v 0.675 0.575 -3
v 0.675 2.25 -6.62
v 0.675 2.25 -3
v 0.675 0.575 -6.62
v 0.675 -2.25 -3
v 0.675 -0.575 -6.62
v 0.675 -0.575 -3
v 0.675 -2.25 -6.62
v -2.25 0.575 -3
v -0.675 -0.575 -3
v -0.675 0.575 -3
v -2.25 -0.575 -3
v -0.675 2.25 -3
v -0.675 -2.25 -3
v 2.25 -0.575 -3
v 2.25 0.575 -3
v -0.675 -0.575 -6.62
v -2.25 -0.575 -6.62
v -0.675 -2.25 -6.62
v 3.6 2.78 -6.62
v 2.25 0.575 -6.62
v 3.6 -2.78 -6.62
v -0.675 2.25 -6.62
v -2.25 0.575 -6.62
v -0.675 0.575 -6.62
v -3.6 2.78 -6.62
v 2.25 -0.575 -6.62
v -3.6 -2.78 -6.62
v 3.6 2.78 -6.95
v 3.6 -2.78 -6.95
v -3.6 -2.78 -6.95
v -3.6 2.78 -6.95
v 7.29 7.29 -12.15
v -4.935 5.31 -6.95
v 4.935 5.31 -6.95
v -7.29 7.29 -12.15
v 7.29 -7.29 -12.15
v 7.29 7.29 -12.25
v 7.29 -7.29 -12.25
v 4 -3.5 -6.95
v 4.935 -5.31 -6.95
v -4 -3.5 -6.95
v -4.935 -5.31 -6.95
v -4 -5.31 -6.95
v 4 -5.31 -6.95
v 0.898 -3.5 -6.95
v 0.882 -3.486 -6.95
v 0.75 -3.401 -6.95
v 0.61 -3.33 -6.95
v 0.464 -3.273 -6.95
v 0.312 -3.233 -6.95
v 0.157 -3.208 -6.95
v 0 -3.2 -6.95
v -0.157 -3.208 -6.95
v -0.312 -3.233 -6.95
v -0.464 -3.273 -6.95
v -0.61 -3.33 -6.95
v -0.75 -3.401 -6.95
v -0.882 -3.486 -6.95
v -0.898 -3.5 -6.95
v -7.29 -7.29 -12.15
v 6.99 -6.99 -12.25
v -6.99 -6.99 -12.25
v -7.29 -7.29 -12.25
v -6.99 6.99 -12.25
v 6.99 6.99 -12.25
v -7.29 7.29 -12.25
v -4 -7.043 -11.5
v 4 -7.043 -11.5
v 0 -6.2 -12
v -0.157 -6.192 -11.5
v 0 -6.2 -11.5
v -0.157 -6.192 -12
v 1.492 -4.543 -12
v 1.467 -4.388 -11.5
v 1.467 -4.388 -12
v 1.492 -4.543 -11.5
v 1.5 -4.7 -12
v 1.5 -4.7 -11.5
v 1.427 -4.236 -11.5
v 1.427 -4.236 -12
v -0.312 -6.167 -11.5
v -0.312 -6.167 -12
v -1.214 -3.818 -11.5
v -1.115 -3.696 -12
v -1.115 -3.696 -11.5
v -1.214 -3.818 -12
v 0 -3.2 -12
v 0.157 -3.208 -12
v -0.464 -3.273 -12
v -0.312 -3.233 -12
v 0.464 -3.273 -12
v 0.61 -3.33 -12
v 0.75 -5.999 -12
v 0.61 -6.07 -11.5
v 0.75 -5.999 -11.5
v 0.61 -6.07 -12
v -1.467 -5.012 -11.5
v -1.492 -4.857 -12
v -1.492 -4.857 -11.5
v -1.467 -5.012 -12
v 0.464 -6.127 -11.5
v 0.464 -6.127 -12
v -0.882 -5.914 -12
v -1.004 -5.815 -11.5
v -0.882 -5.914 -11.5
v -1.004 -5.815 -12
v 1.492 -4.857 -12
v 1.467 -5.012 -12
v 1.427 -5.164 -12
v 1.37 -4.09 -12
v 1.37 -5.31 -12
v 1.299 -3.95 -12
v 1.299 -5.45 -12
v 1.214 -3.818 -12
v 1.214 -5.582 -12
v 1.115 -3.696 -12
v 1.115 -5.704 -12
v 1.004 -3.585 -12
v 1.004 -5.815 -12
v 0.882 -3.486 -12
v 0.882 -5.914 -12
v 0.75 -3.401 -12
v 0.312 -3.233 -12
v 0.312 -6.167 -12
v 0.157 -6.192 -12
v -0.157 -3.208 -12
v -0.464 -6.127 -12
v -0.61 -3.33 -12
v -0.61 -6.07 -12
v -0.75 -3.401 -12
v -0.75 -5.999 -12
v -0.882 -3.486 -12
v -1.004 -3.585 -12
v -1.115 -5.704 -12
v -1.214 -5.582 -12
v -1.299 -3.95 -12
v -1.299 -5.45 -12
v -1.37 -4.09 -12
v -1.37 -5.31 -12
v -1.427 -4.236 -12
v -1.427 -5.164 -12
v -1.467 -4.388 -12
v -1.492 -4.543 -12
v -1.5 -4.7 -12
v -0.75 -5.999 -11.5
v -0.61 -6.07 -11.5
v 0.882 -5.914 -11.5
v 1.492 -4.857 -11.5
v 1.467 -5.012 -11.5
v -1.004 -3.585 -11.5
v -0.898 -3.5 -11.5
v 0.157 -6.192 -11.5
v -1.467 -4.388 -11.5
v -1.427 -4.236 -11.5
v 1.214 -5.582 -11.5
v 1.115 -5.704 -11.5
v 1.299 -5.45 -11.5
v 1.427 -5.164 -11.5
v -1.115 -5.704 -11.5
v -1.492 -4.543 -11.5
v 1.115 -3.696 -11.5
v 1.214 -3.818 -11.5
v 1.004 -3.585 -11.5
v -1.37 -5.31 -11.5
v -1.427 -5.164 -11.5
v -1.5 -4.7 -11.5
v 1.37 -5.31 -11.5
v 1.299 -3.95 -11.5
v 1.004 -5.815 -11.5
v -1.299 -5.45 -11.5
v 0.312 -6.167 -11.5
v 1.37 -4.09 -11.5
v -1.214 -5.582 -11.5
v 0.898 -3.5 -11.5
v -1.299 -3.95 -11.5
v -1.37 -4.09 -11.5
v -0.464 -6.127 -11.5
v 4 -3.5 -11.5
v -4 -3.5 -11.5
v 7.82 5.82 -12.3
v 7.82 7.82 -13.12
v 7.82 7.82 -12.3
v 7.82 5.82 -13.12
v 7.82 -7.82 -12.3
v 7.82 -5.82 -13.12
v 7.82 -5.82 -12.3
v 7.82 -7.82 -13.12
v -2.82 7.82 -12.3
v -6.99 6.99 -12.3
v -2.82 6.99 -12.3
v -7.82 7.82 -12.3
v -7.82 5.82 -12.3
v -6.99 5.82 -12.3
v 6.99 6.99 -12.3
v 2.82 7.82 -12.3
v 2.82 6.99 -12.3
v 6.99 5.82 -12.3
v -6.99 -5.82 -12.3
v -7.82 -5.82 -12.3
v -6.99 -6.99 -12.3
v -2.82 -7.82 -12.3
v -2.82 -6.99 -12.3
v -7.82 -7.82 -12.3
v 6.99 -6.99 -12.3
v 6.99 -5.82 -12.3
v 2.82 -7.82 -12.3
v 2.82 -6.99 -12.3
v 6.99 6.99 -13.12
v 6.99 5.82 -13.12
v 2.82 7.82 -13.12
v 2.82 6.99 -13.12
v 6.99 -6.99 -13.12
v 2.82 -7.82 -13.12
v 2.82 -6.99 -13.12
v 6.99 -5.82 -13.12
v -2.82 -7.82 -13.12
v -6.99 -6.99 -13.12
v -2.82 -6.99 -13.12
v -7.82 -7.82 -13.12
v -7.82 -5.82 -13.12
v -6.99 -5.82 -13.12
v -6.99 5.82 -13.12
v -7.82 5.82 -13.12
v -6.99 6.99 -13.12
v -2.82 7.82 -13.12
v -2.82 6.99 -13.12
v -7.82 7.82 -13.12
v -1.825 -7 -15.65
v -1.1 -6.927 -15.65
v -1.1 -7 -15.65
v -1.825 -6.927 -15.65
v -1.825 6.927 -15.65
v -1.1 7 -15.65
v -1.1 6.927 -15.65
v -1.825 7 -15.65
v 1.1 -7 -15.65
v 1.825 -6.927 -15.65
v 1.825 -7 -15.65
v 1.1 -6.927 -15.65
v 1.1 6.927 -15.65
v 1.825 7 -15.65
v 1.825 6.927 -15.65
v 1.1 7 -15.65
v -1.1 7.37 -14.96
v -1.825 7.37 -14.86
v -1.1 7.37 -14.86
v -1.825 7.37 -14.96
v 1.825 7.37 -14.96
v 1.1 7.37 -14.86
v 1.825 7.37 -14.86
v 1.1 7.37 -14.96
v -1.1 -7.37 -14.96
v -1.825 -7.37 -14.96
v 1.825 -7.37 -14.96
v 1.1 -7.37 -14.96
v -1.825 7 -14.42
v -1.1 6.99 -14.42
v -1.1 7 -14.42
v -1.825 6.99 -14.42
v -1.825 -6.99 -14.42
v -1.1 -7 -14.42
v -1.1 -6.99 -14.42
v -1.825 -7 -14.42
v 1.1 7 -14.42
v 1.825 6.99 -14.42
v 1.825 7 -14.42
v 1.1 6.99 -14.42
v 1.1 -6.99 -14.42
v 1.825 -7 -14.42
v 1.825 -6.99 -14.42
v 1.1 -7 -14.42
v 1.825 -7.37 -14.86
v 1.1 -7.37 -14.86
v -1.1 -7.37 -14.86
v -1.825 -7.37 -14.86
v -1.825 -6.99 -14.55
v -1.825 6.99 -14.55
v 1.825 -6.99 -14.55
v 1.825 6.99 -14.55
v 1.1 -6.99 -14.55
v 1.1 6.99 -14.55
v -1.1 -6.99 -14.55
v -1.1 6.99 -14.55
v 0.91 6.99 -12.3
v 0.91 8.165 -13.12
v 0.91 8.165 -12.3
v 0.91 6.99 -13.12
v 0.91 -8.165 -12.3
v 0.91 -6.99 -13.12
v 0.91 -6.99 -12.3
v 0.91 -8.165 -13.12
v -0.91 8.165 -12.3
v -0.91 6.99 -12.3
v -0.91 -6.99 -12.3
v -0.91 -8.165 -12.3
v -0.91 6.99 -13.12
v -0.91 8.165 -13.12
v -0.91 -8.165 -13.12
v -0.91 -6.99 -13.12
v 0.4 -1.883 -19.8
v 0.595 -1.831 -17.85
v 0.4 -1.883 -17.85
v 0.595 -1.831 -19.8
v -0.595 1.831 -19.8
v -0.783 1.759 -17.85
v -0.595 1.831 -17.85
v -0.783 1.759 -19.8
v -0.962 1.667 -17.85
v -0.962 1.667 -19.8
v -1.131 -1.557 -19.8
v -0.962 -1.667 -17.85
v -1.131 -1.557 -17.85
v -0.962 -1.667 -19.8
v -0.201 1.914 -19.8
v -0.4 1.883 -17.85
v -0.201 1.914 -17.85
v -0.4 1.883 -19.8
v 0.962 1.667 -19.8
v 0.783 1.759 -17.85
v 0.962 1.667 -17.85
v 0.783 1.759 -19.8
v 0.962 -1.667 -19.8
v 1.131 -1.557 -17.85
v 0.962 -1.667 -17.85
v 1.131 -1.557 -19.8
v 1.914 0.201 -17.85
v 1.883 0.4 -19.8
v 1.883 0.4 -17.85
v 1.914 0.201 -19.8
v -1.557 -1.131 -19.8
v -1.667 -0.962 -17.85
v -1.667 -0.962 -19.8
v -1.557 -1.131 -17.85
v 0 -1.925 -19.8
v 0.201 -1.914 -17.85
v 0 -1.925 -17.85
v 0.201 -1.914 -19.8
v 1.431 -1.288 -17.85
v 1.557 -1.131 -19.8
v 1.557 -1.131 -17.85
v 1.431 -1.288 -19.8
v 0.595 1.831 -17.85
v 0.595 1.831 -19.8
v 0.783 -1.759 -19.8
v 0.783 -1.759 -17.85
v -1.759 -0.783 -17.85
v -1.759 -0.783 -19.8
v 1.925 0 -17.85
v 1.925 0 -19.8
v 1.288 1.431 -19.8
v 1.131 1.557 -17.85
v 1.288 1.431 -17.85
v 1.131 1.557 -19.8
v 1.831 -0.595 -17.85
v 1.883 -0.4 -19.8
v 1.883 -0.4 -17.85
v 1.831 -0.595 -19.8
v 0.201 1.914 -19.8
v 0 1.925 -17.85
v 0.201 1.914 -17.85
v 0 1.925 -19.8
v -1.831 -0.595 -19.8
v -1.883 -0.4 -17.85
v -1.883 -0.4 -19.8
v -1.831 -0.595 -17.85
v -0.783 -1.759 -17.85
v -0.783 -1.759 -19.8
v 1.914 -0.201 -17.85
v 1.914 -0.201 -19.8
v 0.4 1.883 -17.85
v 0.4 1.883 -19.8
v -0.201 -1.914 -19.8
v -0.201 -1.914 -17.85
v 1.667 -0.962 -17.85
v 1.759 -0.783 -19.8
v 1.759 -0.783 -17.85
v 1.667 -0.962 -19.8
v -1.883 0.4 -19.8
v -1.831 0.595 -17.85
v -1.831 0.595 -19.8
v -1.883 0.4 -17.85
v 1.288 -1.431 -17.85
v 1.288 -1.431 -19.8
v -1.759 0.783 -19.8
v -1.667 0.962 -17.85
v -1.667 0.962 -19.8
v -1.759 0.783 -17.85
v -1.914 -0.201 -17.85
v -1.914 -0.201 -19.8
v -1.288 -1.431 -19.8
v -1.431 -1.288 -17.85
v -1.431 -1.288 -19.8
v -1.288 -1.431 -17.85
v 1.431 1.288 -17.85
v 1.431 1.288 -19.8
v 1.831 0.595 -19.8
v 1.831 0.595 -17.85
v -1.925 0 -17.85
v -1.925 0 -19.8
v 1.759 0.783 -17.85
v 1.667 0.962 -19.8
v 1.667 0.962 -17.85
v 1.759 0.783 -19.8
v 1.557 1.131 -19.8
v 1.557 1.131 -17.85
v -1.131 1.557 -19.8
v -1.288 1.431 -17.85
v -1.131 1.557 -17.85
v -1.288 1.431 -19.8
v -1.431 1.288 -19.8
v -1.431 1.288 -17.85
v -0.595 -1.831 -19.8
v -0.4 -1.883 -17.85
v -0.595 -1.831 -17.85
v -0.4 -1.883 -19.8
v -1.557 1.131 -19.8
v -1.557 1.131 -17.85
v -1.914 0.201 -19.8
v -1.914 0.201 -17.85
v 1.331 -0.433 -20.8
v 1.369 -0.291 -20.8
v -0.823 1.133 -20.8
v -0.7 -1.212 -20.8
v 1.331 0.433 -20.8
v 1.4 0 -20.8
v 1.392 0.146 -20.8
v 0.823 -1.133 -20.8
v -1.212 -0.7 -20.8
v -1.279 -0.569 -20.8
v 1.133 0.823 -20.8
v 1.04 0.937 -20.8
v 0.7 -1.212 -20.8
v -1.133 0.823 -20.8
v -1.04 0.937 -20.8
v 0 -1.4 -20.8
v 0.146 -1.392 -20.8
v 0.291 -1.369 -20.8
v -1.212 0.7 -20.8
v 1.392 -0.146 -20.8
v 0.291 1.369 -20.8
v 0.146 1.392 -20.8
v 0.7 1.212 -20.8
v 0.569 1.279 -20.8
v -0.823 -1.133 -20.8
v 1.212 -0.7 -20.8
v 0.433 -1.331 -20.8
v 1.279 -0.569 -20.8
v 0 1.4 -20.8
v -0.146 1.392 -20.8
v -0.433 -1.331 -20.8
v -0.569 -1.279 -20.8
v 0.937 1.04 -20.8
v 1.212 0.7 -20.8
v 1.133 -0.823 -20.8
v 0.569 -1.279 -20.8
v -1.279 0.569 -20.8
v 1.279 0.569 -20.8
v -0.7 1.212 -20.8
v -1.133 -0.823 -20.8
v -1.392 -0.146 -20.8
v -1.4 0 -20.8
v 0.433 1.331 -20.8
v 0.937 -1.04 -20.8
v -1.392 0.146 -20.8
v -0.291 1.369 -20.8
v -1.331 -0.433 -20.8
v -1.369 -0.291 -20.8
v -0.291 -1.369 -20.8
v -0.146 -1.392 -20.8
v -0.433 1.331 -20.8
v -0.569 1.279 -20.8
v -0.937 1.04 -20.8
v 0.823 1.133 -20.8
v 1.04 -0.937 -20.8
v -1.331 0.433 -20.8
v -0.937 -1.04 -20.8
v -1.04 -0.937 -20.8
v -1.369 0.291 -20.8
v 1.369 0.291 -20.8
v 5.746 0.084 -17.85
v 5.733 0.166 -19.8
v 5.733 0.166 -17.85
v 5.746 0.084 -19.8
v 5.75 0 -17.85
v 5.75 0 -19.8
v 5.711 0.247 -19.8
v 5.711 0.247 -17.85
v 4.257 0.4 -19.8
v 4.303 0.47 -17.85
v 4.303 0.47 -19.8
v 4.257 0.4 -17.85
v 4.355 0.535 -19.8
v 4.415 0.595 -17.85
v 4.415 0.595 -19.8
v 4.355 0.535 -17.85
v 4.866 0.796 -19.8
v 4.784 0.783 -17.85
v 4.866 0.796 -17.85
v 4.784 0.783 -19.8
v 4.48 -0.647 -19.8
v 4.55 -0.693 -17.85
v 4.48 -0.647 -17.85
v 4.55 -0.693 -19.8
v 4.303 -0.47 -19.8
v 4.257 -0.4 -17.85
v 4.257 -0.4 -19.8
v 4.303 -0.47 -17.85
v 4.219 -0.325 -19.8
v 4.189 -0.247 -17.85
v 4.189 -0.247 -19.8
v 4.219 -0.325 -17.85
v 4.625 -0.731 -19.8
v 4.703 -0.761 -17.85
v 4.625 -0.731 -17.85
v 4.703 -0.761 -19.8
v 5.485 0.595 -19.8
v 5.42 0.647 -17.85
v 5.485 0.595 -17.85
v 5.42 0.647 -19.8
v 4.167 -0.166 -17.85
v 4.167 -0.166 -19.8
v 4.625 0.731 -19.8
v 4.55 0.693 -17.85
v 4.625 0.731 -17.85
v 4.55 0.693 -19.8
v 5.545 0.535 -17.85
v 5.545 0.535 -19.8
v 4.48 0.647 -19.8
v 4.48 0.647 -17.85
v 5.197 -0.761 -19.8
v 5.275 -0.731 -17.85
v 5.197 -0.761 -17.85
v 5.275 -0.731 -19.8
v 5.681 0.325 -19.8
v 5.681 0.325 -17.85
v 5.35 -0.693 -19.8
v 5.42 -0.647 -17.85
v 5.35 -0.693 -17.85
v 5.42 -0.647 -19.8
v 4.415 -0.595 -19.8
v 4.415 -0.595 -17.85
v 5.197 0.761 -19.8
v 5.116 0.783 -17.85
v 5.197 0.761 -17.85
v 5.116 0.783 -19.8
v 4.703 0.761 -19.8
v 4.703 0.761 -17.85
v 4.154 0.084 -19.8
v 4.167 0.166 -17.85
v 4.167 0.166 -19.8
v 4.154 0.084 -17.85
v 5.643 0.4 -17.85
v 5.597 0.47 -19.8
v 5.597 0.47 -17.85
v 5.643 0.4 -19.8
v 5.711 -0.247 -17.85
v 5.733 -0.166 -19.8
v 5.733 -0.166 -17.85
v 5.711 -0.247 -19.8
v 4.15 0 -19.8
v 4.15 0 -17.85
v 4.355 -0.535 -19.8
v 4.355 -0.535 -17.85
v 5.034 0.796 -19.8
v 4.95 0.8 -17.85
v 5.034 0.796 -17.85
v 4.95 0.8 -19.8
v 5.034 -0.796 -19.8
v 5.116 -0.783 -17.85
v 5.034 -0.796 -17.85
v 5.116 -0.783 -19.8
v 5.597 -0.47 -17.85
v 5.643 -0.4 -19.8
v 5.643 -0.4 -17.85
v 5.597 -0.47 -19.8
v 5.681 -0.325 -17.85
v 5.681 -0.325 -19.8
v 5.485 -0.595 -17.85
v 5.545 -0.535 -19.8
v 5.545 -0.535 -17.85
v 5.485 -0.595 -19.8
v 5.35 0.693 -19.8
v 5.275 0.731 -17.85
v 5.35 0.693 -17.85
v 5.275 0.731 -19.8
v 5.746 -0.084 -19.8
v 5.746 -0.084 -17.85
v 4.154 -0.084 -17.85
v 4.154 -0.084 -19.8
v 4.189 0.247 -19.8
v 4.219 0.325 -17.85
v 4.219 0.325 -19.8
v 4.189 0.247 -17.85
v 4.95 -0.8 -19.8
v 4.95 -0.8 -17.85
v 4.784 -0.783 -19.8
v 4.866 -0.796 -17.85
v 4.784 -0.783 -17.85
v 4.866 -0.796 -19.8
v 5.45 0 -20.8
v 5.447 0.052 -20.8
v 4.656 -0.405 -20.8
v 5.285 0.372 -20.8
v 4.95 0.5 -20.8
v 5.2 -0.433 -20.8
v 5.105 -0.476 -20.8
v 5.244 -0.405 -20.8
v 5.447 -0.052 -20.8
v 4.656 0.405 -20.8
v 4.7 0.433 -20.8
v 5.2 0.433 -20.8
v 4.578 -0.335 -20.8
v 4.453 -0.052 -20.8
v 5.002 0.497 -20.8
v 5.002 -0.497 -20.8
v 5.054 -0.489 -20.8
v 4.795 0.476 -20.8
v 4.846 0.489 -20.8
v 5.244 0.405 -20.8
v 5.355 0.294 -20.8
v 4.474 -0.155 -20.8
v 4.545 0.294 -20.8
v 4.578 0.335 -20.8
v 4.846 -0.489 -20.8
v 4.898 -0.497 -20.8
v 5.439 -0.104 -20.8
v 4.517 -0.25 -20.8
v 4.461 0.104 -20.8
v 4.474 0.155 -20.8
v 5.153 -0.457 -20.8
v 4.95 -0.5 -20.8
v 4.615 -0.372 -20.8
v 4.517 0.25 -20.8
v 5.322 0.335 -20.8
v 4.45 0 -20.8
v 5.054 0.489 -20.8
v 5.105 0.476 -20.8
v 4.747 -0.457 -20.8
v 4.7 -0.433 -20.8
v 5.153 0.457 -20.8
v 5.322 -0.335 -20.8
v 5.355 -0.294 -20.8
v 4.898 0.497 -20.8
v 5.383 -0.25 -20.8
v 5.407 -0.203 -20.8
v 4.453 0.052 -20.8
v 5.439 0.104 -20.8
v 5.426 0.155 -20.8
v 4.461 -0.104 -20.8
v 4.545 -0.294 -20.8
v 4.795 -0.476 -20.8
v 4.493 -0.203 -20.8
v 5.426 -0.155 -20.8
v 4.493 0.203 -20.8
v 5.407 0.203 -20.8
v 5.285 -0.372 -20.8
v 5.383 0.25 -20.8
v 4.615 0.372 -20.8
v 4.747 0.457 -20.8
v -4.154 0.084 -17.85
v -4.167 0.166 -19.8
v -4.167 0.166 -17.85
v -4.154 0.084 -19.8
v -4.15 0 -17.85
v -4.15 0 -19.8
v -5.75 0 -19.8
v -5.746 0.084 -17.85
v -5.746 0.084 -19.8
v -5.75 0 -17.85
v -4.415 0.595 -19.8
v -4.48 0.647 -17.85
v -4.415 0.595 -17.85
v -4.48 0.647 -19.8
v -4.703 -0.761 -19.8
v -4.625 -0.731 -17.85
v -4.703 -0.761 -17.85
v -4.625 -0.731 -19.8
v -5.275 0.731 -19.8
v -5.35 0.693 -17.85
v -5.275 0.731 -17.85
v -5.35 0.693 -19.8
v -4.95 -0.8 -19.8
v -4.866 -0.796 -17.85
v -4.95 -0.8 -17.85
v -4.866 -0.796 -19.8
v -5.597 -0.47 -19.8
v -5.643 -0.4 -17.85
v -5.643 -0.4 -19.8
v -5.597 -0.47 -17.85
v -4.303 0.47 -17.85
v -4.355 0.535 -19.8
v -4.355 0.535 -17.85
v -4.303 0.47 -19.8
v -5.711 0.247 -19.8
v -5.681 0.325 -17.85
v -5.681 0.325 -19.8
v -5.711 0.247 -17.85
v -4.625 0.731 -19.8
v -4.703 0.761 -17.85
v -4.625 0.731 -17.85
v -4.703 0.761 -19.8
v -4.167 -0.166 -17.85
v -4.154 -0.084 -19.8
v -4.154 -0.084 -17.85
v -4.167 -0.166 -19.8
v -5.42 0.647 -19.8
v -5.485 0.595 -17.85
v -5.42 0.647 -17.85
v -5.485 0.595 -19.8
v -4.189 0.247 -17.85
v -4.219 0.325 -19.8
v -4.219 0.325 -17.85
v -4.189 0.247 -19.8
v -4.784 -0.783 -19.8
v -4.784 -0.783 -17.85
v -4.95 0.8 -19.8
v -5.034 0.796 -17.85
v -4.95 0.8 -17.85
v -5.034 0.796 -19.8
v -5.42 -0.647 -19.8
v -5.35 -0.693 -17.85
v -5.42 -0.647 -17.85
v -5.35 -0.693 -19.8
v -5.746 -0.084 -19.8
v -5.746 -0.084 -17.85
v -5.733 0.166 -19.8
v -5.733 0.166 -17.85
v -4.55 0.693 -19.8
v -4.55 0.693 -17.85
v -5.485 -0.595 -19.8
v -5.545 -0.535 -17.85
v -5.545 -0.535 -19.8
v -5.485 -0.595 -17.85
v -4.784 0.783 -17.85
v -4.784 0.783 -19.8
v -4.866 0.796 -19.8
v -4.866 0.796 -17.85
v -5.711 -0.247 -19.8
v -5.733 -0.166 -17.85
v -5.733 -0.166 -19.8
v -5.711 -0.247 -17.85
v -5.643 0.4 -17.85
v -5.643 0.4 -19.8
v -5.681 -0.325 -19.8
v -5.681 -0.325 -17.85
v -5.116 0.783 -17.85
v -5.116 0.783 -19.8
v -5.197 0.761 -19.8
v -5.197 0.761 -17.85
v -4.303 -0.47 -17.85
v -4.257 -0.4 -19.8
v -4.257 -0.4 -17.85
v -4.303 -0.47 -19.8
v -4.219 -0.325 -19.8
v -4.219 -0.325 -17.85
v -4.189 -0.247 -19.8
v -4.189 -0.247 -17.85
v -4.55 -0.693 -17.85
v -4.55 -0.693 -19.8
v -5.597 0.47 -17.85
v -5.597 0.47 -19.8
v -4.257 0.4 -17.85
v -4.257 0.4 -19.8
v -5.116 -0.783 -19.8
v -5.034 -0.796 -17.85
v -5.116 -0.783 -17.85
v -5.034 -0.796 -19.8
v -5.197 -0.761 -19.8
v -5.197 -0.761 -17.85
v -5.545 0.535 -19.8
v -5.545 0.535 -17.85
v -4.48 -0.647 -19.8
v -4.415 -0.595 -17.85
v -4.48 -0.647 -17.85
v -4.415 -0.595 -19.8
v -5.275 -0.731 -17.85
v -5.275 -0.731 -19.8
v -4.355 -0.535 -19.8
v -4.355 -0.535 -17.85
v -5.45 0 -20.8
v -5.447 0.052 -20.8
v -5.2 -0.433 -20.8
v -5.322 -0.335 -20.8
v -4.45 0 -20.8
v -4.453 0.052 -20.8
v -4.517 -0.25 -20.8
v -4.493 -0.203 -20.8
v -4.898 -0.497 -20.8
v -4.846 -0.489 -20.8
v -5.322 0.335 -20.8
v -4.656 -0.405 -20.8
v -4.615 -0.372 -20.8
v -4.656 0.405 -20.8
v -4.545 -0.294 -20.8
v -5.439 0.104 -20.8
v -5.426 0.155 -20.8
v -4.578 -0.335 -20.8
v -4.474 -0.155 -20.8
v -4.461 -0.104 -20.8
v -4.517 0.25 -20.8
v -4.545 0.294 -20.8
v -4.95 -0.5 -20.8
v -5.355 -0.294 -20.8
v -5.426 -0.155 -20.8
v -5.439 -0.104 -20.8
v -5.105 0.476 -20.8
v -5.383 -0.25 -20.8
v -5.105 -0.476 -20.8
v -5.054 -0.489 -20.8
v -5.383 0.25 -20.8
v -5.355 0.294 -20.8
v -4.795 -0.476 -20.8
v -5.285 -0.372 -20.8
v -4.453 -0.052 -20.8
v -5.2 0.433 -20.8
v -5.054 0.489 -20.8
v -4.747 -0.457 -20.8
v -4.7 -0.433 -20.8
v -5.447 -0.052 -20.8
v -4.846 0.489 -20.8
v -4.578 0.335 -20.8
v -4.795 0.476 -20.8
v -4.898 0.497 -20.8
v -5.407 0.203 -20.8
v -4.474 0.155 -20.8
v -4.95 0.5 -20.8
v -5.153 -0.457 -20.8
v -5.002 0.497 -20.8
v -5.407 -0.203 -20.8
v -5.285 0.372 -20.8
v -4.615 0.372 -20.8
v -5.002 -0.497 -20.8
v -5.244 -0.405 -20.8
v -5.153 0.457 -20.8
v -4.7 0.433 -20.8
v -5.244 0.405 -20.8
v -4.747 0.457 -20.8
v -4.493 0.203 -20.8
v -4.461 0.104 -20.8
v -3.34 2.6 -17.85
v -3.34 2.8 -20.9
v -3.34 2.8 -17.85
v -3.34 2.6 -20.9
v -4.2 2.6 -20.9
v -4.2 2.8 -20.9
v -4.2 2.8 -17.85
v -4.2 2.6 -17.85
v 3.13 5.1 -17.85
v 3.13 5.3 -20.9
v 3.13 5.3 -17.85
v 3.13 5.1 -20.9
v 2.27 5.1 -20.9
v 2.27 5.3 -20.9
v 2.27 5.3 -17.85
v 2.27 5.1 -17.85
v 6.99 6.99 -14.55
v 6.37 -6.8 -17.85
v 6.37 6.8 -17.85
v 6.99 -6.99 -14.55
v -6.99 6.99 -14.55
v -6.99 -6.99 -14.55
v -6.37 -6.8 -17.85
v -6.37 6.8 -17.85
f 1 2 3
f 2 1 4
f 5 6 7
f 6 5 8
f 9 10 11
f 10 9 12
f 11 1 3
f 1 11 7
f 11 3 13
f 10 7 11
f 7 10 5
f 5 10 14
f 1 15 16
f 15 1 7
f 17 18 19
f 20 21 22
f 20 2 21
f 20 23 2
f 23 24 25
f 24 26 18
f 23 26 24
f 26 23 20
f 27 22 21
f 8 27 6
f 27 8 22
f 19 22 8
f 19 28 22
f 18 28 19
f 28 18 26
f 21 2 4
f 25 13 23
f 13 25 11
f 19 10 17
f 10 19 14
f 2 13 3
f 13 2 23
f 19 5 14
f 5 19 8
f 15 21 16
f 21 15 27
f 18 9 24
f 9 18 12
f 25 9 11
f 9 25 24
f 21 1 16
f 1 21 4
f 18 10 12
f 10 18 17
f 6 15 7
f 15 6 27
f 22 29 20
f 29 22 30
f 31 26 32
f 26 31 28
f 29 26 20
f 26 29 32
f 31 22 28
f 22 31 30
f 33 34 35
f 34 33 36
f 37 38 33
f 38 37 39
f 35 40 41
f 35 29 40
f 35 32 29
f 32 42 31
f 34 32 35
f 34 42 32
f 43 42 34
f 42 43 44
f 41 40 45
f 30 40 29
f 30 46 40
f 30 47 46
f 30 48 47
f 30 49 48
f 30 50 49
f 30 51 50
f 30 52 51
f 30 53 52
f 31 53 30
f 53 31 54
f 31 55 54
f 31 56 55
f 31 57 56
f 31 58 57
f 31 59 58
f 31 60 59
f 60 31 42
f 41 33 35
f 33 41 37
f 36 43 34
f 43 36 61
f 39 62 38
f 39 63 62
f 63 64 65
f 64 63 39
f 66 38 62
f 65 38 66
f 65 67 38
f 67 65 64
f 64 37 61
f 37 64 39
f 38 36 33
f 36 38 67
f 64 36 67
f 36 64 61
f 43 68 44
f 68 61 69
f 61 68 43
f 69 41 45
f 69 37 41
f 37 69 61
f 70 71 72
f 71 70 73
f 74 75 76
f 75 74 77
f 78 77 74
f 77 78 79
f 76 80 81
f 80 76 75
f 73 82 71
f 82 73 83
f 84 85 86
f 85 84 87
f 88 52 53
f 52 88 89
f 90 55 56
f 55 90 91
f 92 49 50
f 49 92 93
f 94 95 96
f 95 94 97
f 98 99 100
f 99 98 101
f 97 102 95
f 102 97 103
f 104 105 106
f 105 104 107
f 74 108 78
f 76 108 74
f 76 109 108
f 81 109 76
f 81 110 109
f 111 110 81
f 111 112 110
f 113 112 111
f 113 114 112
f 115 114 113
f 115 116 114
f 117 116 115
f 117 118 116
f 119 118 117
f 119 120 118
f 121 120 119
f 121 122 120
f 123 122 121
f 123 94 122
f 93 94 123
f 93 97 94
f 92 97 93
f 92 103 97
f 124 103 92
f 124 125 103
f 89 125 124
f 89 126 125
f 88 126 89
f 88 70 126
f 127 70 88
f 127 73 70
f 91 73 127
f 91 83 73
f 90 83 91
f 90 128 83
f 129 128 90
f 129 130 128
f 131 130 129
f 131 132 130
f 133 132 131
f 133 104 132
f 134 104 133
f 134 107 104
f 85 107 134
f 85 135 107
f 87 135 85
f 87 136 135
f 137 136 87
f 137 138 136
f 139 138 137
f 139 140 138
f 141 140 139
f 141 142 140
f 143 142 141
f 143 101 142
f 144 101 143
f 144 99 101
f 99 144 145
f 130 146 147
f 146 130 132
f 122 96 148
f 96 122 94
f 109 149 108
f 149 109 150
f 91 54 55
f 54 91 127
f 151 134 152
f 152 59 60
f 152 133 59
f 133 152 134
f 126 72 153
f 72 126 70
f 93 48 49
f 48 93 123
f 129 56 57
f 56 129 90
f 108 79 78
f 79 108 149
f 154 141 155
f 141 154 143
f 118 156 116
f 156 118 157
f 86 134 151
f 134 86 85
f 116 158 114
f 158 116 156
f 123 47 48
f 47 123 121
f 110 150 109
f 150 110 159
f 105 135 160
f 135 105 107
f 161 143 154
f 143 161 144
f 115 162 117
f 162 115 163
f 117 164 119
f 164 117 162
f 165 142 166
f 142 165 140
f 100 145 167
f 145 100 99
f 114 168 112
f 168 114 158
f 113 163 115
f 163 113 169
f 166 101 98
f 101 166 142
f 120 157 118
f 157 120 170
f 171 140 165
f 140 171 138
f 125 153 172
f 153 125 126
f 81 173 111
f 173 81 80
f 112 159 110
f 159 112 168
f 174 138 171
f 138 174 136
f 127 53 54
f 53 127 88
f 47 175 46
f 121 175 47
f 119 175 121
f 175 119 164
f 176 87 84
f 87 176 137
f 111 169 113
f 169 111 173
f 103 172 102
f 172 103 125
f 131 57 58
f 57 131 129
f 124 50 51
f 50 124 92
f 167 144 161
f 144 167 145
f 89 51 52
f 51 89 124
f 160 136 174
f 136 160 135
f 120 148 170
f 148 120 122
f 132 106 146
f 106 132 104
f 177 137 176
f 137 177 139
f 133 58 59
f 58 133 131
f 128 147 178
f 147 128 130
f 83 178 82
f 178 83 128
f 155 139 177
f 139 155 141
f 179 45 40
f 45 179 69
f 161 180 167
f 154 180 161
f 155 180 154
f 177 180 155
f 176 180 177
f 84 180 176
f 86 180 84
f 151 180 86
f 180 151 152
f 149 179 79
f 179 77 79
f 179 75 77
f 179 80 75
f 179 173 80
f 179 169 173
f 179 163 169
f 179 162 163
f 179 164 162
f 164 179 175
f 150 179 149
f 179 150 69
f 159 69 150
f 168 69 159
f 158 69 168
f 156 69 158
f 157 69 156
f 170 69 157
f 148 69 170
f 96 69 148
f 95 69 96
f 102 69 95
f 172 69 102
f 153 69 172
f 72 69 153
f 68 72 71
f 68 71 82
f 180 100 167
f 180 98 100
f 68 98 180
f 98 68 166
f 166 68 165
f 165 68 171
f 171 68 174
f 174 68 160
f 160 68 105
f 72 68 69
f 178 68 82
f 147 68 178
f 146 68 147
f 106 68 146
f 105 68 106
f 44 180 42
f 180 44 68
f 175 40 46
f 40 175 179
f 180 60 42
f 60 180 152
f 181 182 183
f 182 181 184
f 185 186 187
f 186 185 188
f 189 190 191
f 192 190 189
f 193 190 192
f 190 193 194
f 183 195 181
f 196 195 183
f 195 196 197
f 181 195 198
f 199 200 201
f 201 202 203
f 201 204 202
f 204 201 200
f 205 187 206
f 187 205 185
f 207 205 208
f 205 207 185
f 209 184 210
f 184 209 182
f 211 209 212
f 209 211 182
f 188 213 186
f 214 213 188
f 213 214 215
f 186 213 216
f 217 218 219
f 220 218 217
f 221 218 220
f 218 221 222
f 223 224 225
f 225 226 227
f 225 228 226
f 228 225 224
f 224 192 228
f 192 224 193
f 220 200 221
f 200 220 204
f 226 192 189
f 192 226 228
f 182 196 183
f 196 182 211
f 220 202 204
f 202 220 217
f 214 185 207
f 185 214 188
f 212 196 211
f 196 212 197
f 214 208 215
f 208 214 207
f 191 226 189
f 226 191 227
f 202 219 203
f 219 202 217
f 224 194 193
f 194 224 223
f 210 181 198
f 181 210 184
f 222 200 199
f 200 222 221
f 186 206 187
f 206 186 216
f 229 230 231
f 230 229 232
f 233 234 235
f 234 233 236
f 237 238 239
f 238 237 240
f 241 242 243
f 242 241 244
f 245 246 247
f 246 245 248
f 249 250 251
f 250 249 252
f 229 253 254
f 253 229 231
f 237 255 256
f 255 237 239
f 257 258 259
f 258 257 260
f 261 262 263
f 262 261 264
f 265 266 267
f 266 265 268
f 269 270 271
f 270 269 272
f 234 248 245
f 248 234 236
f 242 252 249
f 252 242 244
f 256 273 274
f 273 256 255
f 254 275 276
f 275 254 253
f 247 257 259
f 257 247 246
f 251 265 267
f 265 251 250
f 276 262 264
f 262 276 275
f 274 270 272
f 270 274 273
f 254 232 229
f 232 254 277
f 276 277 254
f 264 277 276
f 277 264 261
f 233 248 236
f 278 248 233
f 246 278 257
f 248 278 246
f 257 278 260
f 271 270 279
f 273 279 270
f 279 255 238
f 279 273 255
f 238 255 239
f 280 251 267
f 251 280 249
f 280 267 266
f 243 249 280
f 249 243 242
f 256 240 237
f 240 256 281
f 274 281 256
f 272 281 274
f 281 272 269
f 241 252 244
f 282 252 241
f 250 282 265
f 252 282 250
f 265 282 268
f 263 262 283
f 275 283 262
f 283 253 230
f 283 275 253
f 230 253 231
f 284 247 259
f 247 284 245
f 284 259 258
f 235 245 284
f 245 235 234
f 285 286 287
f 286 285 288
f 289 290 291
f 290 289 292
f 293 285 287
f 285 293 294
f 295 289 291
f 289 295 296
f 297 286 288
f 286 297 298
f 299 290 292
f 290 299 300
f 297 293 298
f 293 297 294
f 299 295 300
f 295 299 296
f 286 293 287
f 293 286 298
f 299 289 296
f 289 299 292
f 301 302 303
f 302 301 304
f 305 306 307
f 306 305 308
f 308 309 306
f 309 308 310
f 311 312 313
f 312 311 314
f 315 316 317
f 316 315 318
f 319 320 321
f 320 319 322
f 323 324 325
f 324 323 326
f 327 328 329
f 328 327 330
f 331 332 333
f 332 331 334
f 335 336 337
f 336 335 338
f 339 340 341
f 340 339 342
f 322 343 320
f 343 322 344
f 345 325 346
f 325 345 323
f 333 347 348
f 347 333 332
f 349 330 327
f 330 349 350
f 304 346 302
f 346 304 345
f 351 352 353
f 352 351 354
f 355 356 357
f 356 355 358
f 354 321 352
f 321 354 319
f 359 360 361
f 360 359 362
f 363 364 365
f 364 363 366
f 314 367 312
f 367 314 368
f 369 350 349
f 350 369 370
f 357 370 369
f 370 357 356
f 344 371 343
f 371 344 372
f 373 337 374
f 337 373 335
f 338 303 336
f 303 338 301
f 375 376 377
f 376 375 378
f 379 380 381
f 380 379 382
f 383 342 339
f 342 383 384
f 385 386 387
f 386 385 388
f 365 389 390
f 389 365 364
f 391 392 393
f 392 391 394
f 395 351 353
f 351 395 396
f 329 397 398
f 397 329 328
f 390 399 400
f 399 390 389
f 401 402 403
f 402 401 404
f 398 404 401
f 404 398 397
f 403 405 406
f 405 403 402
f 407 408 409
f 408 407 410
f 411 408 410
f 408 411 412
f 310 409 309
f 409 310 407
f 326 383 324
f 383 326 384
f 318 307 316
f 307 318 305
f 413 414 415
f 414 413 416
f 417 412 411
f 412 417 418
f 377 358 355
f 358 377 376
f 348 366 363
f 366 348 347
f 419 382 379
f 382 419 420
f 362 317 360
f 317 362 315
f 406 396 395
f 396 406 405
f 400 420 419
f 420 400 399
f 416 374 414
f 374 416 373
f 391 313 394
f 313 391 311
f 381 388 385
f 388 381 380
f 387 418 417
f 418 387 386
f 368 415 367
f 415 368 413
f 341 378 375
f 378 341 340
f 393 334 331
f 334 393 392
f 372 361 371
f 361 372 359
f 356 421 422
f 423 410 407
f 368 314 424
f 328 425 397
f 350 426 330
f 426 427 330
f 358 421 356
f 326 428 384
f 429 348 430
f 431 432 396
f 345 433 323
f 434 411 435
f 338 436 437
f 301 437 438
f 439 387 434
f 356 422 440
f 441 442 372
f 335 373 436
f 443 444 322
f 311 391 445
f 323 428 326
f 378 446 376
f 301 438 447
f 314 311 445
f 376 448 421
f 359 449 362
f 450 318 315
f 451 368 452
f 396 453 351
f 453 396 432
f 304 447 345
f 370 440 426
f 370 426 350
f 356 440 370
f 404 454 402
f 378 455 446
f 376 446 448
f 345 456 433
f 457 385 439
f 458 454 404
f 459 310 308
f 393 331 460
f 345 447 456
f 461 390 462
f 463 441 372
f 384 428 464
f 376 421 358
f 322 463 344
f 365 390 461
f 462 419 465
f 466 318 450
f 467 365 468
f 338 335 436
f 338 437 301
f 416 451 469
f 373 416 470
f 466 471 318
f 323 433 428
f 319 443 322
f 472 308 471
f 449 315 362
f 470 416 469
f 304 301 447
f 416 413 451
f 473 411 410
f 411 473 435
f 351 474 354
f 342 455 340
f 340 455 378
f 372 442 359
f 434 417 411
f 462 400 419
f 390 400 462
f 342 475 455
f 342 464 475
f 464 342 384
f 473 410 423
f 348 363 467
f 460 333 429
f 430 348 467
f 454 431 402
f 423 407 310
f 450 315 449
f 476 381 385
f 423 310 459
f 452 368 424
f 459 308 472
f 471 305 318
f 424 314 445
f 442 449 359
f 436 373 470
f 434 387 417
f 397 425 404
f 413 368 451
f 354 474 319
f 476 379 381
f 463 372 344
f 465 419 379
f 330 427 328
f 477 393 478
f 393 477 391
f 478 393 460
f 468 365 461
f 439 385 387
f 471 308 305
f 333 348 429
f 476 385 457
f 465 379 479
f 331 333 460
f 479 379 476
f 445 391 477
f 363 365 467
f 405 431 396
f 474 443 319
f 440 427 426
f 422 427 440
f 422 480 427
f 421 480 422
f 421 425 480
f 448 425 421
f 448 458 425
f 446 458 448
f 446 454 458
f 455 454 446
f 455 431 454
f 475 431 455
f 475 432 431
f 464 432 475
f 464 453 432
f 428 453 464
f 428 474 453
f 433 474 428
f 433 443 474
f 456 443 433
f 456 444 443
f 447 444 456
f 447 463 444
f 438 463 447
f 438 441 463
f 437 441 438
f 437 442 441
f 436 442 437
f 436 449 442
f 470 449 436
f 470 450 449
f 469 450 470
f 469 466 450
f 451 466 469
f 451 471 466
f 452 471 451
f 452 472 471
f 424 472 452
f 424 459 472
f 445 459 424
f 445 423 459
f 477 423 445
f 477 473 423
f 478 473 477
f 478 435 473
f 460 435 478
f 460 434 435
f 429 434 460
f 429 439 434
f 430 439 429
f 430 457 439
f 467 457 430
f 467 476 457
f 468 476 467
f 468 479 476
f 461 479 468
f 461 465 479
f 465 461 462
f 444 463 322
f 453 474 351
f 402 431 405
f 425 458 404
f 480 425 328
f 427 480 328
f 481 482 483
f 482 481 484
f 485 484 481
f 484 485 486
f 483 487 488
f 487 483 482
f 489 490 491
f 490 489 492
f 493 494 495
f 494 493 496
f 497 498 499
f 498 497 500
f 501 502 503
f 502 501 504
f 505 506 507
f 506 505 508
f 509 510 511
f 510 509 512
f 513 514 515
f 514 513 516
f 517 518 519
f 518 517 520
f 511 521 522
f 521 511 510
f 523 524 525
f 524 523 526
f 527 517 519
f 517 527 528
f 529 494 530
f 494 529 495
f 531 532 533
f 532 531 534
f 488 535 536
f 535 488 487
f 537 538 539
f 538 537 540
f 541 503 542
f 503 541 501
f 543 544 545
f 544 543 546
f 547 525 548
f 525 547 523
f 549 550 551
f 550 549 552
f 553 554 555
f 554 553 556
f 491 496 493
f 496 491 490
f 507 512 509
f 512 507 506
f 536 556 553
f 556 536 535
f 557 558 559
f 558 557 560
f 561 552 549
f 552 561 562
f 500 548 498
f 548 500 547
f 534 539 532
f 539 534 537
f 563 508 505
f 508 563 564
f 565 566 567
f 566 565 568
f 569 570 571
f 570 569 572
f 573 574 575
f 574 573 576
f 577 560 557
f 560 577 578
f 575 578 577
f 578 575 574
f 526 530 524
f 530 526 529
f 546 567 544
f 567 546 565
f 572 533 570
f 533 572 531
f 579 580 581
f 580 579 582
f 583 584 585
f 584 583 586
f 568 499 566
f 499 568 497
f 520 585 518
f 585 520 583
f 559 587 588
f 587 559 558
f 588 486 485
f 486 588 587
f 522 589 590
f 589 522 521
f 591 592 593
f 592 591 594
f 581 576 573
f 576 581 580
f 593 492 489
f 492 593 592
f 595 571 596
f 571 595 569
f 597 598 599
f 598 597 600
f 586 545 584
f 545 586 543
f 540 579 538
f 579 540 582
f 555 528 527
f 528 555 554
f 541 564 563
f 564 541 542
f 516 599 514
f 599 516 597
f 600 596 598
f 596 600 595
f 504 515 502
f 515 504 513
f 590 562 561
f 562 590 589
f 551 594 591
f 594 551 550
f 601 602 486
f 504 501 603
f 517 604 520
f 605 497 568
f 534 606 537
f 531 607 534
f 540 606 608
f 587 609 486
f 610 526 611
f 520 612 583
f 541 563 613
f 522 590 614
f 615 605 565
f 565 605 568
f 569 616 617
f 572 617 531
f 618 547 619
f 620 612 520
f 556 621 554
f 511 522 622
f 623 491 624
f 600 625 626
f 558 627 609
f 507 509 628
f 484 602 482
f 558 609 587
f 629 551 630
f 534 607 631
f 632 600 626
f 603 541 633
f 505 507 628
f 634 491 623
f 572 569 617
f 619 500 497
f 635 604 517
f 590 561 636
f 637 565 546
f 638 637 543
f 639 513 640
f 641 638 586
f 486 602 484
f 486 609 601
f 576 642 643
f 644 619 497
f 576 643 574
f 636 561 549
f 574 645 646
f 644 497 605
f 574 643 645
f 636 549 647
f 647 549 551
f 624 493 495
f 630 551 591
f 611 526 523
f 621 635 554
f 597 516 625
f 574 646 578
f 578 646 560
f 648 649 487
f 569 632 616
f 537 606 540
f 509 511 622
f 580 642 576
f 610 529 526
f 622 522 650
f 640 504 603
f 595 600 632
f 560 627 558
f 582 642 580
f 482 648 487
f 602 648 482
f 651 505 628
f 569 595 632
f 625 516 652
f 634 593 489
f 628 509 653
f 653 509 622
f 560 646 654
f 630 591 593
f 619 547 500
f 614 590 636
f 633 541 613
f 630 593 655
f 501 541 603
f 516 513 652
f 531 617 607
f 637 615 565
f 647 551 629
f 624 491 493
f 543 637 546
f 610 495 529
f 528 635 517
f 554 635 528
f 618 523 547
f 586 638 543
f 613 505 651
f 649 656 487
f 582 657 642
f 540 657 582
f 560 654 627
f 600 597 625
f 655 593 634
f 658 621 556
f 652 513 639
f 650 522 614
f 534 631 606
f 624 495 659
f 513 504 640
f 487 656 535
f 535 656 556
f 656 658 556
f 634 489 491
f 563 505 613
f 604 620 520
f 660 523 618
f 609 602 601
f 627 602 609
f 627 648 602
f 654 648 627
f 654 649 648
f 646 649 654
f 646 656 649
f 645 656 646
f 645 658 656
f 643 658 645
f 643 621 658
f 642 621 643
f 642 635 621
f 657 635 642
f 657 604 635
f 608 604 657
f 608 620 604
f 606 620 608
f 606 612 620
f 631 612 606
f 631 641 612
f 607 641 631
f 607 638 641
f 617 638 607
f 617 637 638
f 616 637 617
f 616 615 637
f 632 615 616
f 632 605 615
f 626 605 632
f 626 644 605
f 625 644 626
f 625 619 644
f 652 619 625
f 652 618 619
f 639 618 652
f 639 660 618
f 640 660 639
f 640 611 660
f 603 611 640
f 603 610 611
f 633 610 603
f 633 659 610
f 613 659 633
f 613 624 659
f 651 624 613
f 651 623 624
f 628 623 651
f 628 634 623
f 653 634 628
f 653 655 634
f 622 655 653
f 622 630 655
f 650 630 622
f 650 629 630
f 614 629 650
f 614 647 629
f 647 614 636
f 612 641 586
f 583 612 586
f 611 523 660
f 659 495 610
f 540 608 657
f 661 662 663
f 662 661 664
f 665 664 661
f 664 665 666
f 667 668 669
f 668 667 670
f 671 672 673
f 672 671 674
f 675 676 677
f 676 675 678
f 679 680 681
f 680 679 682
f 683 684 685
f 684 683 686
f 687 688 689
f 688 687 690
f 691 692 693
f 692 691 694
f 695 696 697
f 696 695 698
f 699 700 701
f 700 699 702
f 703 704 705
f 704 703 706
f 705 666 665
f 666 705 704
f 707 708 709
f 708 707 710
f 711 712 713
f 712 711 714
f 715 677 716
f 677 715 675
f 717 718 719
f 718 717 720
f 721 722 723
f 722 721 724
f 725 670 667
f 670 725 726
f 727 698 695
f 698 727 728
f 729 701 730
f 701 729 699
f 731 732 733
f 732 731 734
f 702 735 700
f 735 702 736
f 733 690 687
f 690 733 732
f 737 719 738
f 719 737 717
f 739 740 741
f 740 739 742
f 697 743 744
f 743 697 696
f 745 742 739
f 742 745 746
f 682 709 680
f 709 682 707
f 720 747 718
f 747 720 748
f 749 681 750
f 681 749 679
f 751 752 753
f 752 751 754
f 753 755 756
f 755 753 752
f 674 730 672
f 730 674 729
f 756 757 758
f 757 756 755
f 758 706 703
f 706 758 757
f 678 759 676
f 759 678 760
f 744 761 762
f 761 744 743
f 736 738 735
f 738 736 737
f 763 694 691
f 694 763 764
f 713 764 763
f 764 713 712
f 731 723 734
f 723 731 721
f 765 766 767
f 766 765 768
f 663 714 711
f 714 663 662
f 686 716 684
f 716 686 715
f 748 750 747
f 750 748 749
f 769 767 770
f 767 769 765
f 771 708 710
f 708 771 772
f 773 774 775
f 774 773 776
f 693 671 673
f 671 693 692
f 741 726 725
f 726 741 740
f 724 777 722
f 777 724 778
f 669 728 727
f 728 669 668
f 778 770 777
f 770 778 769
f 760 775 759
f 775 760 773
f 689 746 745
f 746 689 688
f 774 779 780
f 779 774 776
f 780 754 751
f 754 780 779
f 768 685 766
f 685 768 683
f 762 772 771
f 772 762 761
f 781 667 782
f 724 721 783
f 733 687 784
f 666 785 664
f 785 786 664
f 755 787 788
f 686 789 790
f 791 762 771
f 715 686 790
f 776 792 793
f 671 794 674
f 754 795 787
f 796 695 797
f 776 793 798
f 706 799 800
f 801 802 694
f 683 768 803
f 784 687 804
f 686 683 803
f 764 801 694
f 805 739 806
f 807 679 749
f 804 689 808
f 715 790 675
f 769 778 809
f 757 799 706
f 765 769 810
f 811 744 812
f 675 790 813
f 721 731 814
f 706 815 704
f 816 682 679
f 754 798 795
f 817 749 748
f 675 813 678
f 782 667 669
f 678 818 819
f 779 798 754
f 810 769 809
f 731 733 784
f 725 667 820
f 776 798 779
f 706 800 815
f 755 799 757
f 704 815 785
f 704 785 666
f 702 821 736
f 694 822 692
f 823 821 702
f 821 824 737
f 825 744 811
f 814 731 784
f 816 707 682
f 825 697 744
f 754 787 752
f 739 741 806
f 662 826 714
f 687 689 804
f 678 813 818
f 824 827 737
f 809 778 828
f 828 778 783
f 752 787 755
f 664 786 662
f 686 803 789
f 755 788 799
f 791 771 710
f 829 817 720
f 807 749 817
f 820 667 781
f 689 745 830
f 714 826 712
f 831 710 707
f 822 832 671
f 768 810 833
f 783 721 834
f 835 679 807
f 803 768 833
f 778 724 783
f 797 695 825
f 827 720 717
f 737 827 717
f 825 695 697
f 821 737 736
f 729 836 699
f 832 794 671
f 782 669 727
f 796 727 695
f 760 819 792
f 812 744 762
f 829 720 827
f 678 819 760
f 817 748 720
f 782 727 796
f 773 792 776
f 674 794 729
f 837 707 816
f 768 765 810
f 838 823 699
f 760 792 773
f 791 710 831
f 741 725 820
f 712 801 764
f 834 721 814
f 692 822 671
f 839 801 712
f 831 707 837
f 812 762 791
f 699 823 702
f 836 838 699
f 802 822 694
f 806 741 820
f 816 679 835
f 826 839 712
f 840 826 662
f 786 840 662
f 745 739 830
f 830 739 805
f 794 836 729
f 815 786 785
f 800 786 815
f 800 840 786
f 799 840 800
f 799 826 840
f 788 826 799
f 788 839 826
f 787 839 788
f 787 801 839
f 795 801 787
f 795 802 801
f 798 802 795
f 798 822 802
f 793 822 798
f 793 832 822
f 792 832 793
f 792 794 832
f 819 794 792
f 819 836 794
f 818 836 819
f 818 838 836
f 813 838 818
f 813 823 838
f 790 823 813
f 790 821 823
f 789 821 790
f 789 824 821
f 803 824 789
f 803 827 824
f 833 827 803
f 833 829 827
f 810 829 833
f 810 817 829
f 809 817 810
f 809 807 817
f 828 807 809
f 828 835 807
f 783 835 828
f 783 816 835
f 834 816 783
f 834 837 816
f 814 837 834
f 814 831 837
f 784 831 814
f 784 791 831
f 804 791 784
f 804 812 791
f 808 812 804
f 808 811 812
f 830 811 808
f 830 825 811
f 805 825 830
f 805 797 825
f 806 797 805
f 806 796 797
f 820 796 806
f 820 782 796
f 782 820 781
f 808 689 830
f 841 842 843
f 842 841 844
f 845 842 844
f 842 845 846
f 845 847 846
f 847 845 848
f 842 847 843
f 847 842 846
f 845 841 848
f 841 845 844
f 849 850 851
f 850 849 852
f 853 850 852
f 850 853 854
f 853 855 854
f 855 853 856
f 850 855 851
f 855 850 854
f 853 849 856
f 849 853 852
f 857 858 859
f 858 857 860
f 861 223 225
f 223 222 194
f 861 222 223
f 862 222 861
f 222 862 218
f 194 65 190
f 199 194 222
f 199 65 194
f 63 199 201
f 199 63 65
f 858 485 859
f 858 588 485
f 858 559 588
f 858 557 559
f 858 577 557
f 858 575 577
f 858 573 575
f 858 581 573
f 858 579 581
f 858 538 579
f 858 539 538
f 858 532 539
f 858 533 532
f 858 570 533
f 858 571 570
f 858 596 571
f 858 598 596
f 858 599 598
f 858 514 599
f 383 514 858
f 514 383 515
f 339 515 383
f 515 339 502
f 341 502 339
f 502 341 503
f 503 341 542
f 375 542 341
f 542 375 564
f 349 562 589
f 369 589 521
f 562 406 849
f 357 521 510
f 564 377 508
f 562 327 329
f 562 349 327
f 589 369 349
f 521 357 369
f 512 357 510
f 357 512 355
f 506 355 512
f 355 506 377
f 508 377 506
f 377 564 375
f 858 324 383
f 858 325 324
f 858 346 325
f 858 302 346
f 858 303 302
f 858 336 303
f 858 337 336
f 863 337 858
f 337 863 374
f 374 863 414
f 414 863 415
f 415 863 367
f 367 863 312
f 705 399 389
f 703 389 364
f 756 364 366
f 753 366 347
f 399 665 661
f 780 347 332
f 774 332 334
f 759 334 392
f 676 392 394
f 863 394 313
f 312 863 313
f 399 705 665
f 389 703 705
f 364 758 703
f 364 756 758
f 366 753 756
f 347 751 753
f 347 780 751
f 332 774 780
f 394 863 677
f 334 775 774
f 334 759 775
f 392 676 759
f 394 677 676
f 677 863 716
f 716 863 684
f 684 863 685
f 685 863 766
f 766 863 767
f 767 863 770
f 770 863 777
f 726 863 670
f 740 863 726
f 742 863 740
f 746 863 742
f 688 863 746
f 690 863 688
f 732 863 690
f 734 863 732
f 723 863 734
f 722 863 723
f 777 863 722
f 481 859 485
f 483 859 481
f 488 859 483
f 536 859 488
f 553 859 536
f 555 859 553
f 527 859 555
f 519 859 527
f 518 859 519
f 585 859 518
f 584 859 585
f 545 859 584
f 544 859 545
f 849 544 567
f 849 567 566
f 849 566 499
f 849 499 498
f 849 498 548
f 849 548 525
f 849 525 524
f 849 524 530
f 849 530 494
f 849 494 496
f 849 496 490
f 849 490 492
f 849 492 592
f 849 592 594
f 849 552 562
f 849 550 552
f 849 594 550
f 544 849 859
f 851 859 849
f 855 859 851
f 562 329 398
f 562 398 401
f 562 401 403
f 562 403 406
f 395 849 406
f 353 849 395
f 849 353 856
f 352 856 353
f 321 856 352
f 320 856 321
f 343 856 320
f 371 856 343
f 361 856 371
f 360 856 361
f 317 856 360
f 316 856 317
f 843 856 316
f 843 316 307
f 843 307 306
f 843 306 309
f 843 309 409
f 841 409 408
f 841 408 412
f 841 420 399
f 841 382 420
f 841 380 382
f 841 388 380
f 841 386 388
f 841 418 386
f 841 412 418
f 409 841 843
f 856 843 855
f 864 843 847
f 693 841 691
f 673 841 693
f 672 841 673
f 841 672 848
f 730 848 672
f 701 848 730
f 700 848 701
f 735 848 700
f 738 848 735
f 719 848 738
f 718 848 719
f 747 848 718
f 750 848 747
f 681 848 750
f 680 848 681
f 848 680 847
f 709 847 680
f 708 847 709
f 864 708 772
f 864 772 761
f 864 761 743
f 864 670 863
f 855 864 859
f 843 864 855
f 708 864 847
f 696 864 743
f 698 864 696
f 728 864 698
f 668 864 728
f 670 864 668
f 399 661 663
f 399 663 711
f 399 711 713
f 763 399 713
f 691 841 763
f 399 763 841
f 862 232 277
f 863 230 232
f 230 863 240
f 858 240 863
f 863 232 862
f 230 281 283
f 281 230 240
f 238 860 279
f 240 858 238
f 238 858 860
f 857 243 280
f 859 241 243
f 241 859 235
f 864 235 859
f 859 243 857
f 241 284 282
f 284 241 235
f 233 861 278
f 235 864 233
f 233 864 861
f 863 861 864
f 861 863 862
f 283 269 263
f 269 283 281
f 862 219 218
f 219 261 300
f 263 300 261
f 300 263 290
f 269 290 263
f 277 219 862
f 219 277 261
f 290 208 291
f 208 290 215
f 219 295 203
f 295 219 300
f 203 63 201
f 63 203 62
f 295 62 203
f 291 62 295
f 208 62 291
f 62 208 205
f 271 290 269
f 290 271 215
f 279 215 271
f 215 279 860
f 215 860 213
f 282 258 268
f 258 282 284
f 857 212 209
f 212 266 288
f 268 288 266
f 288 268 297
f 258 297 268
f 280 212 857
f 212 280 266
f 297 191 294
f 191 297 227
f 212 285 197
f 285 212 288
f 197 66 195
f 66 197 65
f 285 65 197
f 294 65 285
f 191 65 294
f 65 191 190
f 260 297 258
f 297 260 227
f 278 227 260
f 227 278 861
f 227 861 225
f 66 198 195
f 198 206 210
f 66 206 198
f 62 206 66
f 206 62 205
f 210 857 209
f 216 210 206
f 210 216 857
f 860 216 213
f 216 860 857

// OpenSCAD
$fn=60;
/**
a cherry mx switch.

most of the measurements done with a caliper. some taken from
http://geekhack.org/index.php?topic=47744.0

This is just to illustrate and to drop in a a gross reference. It is mostly artistic apart from the steam and mounting plate dimensions
*/

// move the whole thing 3mm to give the empty space in usual keycaps.
// that is, the extra space inside a keycap female connector.
// i do that since i create all my keycaps with 0,0,0 being the internal base of the keycap
translate([0,0,-3])
{

	//1. steam
	color("brown"){
		//1.1. l-r tab is 1.35mm
		translate([0,0,-3.62/2])
			cube([1.35,4.5,3.62], center=true);
		//1.2. f-b tab is 1.15mm. it has a smal notch that i will ignore.
		translate([0,0,-3.62/2])
			cube([4.5,1.15,3.62], center=true);
		//1.3. base. it has a chamfered top that i will ignore.
		translate([0,0,-5.62])
			cube([7.2,5.56,4], center=true);
	}
	// 2. top
	color("grey"){
		difference(){
			// make a trapezoid with the general shape (volume?) of the top
			hull(){
				translate([0,0,-4]) //distance from top of switch... some i measured 3.9 others 4.2... so leaving at 4
					cube([9.87,10.62,0.1], center=true);
				translate([0,0,-4 -5.2]) // bottom has a measured 5.3... so move 5.2 and use the 0.1 bellow
					cube([14.58,14.58,0.1], center=true);
			}

		// and subtract:
		// the front led. NOTE: totally off... measured by eye. just for astetics
		// adding just so there is a visual cue of the direction
			translate([0,-4.7,-6])
				cylinder(r=3/2, h=6, center=true);
			translate([0,-5.5,-6])
				cube([8,4,5], center=true);
		// the four corners
			// TODO waste of time? this is all for looks, you shouldn't invade any of that space anyway...
		}
	}

	// 3. bottom
	color("green")
		// 3.1 main body volume
		hull(){
				translate([0,0,-4 -5.3]) //steam + top
					cube([13.98,13.98,0.1], center=true);
				translate([0,0,-4 -5.3 -2.2]) //steam + top + straigth part
					cube([13.98,13.98,0.1], center=true);
				translate([0,0,-4 -5.3 -5.5]) //steam + top + bottom (measured 5.5)
					cube([12.74,13.6,0.1], center=true);
		}
		// 3.2 tabs
		// note: only measured the lenght, if they are slightly off-center, this will be all wrong :)
		color("black")
		difference(){
			translate([0,0,-4 -5.3 -0.82/2]) //steam + top
				cube([15.64,15.64,0.82], center=true);
			translate([0,0,-4 -5.3 -0.82/2  ]) // front-back cut
				cube([5.64,20,0.82 +2], center=true);
			translate([0,0,-4 -5.3 -0.82/2  ]) //side cut
				cube([20,11.64,0.82 +2], center=true);
		}

		// 3.3 tab (plate snap on). to use this mechanically, you have to take into account the bending (as it will move the bottom part slightly up...) just for gross reference here for now
		color("white"){
			// 3.3.1 top
			translate([0,0,-4 -5.3 -0.82/2  ]) // front-back cut
				cube([1.82,16.33,0.82], center=true);
			// 3.3.2 bottom
			difference(){
				hull(){
					translate([0,0,-4 -5.3 -0.82/2 -1.76  ]) // front-back cut
						cube([3.65,14,0.1], center=true);
					translate([0,0,-4 -5.3 -0.82/2 -2.2  ]) // front-back cut
						cube([3.65,14.74,0.1], center=true);
					translate([0,0,-4 -5.3 -0.82/2 -2.89  ]) // front-back cut
						cube([3.65,14,0.1], center=true);
				}
				translate([0,0,-4 -5.3 -0.82/2 -1.76   ]) // front-back cut
					cube([2.2,20,4], center=true);

			}
		}

		// 4. bottom guides
		// again, i'm assuming everything is centered...
		color("darkGreen"){
			// 4.1 cylinder
			translate([0,0,-4 -5.3 -5.5 -2/2]) //steam + top + bottom (measured 5.5)
				cylinder(r=3.85/2, h=2, center=true);
			translate([0,0,-4 -5.3 -5.5 -2 -1/2]) //steam + top + bottom (measured 5.5)
				cylinder(r2=3.85/2, r=2.8/2, h=1, center=true);
			// 4.2 PCB pins
			translate([4.95,0,-4 -5.3 -5.5 -2/2]) //steam + top + bottom (measured 5.5)
				cylinder(r=1.6/2, h=2, center=true);
			translate([4.95,0,-4 -5.3 -5.5 -2 -1/2]) //steam + top + bottom (measured 5.5)
				cylinder(r2=1.6/2, r=1/2, h=1, center=true);
			translate([-4.95,0,-4 -5.3 -5.5 -2/2]) //steam + top + bottom (measured 5.5)
				cylinder(r=1.6/2, h=2, center=true);
			translate([-4.95,0,-4 -5.3 -5.5 -2 -1/2]) //steam + top + bottom (measured 5.5)
				cylinder(r2=1.6/2, r=1/2, h=1, center=true);
		}

		// 5. pins
		color("orange"){
			translate([-3.77,2.7,-4 -5.3 -5.5 -3.1/2]) //steam + top + bottom (measured 5.5)
				cube([.86, 0.2,3.1], center=true);
			translate([2.7,5.2,-4 -5.3 -5.5 -3.1/2]) //steam + top + bottom (measured 5.5)
				cube([.86, 0.2,3.1], center=true);
		}

}
